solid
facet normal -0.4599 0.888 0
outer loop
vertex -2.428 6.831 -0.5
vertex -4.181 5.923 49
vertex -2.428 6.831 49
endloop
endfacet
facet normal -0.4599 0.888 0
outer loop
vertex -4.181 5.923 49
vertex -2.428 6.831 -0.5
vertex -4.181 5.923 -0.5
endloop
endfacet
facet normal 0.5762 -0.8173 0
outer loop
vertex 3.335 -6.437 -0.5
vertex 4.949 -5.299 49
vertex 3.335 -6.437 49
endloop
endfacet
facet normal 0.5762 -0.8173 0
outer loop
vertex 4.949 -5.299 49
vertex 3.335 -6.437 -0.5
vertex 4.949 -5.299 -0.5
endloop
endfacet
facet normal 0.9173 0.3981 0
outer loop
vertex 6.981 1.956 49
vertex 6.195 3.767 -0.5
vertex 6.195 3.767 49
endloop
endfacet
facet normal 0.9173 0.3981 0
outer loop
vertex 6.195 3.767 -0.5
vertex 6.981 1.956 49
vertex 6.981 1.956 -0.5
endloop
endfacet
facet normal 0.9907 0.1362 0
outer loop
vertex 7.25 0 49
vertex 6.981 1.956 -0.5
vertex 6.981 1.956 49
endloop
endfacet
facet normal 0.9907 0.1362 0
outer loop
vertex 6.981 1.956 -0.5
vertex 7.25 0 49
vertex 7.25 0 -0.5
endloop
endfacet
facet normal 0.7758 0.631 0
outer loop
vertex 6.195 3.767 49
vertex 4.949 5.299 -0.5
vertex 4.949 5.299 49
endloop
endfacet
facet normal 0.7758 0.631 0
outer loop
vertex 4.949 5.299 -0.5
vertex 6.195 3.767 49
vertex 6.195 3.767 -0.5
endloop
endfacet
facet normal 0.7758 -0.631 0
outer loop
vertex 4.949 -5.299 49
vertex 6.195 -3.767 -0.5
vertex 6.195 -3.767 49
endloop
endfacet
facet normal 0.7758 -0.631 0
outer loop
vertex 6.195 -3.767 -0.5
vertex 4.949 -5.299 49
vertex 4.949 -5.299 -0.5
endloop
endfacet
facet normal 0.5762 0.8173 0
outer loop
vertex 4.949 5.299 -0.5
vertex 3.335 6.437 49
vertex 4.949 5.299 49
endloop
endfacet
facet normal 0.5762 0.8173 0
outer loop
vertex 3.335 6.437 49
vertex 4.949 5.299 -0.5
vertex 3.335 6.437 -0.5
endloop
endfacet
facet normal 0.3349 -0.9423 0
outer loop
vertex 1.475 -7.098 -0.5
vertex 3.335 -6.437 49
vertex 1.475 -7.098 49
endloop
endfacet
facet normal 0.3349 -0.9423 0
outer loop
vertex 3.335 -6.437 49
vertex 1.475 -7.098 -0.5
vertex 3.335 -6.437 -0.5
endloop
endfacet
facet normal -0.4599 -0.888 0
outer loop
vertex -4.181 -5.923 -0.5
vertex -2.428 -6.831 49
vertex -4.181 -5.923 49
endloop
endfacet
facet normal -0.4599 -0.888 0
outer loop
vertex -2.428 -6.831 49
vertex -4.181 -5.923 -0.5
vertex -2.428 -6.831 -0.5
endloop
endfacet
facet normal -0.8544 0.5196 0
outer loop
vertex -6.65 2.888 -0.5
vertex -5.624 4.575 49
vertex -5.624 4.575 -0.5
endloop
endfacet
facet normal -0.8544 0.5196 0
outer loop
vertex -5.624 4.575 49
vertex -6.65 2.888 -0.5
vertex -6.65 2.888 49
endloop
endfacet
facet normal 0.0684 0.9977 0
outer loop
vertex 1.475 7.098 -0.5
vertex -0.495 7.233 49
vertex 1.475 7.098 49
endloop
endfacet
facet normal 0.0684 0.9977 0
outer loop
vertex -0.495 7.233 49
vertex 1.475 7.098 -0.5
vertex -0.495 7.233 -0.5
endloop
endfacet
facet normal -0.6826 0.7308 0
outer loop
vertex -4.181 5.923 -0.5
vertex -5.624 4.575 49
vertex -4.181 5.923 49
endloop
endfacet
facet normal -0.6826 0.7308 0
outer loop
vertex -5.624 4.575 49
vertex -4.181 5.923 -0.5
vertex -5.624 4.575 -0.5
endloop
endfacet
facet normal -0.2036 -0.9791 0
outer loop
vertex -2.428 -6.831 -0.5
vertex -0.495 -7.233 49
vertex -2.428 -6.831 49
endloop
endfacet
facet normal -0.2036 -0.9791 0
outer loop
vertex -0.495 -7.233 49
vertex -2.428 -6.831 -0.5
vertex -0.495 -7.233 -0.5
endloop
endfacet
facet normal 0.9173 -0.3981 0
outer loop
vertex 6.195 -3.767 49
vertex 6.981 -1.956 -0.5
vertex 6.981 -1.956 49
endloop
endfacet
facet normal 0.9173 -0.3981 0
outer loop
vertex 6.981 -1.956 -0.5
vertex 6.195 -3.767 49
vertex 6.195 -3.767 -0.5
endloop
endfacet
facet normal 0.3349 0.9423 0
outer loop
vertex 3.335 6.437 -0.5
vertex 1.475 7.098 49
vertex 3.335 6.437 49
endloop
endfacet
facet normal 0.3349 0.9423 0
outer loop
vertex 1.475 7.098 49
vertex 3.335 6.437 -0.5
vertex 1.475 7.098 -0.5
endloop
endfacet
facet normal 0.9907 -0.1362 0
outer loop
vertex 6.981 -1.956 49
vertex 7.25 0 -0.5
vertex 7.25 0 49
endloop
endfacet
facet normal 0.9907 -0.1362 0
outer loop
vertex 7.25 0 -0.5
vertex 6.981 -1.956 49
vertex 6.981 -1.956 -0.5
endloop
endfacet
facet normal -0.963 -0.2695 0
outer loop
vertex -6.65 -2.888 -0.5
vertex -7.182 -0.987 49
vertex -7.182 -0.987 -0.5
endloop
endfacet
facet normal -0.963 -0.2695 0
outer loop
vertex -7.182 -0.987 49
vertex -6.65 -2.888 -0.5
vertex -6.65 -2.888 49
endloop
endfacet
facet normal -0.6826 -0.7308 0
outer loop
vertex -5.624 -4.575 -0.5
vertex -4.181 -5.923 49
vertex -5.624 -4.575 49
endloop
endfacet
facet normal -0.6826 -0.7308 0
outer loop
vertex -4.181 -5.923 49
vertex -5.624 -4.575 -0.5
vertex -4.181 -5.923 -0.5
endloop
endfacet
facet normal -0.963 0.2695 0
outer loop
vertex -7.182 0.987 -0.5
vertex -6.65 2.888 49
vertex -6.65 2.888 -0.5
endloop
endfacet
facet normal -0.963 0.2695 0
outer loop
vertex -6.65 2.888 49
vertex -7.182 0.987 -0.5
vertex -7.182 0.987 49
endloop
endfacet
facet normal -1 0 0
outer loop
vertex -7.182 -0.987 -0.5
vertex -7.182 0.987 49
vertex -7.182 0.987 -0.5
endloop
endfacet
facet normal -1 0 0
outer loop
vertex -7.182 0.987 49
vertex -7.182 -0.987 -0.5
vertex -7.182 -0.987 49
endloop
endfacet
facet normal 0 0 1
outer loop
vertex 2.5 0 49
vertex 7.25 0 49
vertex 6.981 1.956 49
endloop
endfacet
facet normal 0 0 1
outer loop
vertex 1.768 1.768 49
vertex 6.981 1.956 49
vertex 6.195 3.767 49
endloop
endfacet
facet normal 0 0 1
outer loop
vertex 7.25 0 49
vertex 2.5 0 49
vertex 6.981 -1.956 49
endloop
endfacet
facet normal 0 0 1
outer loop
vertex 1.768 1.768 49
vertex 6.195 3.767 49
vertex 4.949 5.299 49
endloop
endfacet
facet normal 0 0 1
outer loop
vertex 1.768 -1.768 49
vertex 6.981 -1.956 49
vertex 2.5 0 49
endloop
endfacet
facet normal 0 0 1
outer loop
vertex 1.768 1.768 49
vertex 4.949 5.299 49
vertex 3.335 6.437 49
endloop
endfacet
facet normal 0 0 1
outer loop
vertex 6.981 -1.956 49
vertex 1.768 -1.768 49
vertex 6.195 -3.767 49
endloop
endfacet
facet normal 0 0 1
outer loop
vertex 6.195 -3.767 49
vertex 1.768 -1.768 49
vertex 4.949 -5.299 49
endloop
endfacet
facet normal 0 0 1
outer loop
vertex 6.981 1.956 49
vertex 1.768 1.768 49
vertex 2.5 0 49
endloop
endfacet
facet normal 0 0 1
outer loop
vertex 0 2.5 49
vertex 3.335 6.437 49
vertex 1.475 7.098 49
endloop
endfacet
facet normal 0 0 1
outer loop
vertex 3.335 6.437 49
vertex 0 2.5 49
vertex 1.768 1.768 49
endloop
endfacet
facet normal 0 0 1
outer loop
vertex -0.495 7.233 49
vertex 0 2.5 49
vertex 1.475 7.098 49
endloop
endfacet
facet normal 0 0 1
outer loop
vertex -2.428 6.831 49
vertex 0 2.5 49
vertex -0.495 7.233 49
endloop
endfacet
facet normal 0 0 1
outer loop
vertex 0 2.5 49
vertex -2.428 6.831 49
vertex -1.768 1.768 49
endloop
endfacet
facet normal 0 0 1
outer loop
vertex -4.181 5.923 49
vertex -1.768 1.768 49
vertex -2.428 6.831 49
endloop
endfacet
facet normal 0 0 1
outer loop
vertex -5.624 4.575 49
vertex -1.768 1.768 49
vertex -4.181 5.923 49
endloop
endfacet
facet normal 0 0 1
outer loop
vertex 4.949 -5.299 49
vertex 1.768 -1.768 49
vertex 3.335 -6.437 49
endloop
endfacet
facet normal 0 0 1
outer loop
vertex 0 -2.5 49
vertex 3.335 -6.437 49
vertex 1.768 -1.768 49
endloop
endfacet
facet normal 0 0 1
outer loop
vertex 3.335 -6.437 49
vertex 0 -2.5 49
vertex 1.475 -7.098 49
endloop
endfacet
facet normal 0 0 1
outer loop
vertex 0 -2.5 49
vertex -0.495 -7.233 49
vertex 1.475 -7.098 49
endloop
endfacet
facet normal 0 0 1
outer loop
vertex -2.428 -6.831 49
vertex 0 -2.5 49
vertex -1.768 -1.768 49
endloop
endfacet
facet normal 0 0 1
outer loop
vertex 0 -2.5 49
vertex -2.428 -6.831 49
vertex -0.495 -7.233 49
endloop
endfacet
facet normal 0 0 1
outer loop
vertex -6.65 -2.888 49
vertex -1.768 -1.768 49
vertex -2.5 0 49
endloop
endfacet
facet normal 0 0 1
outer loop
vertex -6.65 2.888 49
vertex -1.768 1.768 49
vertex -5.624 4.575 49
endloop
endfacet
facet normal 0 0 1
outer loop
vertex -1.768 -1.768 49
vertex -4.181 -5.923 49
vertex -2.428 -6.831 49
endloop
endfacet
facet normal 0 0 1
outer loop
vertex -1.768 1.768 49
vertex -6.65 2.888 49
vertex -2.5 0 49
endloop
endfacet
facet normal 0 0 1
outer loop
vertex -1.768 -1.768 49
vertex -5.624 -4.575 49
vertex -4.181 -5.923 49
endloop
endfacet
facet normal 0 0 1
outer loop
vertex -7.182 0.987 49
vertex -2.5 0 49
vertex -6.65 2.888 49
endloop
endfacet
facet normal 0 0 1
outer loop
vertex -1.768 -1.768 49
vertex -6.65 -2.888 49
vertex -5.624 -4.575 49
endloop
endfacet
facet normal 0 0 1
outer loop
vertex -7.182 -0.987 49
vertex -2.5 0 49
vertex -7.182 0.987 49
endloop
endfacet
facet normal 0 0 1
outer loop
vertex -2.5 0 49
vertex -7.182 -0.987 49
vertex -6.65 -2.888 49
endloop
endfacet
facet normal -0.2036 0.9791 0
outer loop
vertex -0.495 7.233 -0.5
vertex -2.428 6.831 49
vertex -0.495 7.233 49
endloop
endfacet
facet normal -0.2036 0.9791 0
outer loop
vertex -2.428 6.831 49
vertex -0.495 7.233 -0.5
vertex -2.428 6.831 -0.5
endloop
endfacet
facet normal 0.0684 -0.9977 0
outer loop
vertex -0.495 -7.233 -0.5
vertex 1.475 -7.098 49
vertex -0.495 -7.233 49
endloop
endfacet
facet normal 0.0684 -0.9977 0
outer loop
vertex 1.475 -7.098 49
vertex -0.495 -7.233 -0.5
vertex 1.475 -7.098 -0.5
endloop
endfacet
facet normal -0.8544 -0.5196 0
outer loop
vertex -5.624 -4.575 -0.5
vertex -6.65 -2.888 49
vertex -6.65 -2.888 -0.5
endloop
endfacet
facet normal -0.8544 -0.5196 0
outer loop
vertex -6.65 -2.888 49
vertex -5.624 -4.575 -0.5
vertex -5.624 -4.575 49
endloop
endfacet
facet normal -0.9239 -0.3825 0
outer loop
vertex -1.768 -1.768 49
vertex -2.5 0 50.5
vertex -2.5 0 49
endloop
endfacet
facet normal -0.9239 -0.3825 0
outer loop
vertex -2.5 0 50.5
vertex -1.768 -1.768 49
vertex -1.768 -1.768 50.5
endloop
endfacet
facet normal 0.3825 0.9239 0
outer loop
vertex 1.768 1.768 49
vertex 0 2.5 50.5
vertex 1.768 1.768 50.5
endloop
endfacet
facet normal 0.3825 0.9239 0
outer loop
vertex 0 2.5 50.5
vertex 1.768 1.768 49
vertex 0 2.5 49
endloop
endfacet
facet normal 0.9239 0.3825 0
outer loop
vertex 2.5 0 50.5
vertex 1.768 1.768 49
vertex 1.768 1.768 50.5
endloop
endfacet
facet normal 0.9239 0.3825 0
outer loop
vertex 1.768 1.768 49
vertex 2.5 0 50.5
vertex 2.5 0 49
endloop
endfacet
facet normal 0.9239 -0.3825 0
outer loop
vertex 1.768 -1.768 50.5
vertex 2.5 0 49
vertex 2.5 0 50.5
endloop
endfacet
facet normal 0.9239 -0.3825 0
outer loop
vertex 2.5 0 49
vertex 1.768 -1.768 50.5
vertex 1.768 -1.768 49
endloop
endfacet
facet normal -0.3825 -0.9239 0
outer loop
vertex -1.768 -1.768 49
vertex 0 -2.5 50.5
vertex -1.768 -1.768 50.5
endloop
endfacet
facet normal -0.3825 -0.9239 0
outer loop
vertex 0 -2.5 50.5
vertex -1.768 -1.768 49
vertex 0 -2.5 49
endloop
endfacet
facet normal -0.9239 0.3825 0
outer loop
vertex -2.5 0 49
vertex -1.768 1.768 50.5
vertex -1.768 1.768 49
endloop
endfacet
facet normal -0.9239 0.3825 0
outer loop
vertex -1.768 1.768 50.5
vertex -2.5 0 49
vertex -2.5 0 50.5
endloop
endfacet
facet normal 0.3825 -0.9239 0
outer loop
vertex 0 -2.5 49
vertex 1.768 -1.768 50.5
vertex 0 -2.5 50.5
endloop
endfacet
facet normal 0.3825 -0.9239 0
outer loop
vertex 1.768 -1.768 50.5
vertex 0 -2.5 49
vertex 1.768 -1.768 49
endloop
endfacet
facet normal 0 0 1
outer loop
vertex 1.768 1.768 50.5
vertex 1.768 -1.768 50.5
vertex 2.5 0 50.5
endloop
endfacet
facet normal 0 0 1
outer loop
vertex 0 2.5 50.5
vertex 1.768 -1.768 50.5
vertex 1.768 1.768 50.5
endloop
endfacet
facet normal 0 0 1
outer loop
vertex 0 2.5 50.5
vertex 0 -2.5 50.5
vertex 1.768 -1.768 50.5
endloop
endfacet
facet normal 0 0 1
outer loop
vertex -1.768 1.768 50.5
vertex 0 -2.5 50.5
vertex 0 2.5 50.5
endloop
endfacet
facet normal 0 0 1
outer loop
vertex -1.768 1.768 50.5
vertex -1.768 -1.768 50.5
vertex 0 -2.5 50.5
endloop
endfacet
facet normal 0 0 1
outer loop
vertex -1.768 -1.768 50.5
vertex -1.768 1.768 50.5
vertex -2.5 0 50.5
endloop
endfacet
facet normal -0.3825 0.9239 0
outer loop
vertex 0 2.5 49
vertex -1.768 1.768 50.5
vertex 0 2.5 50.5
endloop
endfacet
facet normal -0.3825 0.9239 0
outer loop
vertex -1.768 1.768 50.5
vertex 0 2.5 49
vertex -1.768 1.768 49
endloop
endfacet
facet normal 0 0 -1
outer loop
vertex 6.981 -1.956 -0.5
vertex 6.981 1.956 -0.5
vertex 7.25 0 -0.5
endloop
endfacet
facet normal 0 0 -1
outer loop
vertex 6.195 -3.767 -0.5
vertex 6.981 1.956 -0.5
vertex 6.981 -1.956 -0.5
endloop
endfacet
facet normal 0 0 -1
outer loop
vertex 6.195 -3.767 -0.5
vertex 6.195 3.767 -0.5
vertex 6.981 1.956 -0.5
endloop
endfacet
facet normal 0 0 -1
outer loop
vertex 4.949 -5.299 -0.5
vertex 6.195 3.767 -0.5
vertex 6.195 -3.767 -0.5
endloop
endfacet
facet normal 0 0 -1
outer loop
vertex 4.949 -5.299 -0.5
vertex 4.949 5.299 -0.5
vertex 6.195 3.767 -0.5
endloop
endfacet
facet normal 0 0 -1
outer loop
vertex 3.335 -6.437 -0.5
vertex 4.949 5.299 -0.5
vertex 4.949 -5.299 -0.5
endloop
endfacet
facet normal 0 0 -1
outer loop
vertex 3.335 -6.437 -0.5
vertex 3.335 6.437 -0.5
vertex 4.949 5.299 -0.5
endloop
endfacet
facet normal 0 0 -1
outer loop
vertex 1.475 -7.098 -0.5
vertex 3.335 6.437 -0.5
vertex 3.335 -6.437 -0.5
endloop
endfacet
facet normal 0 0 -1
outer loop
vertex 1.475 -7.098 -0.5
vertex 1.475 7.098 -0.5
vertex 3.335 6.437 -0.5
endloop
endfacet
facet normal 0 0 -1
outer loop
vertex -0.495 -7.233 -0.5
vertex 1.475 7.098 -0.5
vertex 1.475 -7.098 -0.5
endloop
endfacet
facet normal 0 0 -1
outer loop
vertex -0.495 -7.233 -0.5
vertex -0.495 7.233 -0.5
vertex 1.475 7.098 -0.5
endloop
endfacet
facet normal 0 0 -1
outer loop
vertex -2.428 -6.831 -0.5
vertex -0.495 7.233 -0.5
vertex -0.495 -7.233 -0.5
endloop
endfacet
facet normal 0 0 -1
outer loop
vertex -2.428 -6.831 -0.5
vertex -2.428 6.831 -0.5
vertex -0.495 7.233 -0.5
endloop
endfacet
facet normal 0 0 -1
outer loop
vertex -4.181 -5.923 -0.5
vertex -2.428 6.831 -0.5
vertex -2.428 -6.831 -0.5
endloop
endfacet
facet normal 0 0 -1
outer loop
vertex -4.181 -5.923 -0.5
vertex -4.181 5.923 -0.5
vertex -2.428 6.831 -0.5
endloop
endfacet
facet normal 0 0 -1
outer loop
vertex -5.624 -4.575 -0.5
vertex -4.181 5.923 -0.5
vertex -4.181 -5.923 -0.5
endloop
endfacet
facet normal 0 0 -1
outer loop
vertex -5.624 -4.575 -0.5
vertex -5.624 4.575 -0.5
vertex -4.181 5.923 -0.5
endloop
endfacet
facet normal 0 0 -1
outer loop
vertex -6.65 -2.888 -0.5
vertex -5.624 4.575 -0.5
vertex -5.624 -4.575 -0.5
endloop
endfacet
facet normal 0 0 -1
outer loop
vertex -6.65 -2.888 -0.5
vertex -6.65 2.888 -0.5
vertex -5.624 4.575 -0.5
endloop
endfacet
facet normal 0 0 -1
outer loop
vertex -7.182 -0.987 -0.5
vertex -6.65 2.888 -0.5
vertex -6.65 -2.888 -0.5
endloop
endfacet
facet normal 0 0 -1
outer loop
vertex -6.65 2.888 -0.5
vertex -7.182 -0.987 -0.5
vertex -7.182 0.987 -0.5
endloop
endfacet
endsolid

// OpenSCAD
// Cylindrical battery cell model

// Parameters
battery_height = 50.5;
battery_diameter = 14.5;
positive_terminal_height = 1.5;
positive_terminal_diameter = 5;
negative_terminal_height = 0.5;

// Main battery body
module cylindrical_cell_body() {
    cylinder(h = battery_height - positive_terminal_height, d = battery_diameter, center = false);
}

// Positive terminal button
module positive_terminal_button() {
    translate([0, 0, battery_height - positive_terminal_height])
        cylinder(h = positive_terminal_height, d = positive_terminal_diameter, center = false);
}

// Negative terminal flat end
module negative_terminal_flat_end() {
    translate([0, 0, -negative_terminal_height])
        cylinder(h = negative_terminal_height, d = battery_diameter, center = false);
}

// Complete battery model
module battery() {
    cylindrical_cell_body();
    positive_terminal_button();
    negative_terminal_flat_end();
}

// Render the battery
battery();
